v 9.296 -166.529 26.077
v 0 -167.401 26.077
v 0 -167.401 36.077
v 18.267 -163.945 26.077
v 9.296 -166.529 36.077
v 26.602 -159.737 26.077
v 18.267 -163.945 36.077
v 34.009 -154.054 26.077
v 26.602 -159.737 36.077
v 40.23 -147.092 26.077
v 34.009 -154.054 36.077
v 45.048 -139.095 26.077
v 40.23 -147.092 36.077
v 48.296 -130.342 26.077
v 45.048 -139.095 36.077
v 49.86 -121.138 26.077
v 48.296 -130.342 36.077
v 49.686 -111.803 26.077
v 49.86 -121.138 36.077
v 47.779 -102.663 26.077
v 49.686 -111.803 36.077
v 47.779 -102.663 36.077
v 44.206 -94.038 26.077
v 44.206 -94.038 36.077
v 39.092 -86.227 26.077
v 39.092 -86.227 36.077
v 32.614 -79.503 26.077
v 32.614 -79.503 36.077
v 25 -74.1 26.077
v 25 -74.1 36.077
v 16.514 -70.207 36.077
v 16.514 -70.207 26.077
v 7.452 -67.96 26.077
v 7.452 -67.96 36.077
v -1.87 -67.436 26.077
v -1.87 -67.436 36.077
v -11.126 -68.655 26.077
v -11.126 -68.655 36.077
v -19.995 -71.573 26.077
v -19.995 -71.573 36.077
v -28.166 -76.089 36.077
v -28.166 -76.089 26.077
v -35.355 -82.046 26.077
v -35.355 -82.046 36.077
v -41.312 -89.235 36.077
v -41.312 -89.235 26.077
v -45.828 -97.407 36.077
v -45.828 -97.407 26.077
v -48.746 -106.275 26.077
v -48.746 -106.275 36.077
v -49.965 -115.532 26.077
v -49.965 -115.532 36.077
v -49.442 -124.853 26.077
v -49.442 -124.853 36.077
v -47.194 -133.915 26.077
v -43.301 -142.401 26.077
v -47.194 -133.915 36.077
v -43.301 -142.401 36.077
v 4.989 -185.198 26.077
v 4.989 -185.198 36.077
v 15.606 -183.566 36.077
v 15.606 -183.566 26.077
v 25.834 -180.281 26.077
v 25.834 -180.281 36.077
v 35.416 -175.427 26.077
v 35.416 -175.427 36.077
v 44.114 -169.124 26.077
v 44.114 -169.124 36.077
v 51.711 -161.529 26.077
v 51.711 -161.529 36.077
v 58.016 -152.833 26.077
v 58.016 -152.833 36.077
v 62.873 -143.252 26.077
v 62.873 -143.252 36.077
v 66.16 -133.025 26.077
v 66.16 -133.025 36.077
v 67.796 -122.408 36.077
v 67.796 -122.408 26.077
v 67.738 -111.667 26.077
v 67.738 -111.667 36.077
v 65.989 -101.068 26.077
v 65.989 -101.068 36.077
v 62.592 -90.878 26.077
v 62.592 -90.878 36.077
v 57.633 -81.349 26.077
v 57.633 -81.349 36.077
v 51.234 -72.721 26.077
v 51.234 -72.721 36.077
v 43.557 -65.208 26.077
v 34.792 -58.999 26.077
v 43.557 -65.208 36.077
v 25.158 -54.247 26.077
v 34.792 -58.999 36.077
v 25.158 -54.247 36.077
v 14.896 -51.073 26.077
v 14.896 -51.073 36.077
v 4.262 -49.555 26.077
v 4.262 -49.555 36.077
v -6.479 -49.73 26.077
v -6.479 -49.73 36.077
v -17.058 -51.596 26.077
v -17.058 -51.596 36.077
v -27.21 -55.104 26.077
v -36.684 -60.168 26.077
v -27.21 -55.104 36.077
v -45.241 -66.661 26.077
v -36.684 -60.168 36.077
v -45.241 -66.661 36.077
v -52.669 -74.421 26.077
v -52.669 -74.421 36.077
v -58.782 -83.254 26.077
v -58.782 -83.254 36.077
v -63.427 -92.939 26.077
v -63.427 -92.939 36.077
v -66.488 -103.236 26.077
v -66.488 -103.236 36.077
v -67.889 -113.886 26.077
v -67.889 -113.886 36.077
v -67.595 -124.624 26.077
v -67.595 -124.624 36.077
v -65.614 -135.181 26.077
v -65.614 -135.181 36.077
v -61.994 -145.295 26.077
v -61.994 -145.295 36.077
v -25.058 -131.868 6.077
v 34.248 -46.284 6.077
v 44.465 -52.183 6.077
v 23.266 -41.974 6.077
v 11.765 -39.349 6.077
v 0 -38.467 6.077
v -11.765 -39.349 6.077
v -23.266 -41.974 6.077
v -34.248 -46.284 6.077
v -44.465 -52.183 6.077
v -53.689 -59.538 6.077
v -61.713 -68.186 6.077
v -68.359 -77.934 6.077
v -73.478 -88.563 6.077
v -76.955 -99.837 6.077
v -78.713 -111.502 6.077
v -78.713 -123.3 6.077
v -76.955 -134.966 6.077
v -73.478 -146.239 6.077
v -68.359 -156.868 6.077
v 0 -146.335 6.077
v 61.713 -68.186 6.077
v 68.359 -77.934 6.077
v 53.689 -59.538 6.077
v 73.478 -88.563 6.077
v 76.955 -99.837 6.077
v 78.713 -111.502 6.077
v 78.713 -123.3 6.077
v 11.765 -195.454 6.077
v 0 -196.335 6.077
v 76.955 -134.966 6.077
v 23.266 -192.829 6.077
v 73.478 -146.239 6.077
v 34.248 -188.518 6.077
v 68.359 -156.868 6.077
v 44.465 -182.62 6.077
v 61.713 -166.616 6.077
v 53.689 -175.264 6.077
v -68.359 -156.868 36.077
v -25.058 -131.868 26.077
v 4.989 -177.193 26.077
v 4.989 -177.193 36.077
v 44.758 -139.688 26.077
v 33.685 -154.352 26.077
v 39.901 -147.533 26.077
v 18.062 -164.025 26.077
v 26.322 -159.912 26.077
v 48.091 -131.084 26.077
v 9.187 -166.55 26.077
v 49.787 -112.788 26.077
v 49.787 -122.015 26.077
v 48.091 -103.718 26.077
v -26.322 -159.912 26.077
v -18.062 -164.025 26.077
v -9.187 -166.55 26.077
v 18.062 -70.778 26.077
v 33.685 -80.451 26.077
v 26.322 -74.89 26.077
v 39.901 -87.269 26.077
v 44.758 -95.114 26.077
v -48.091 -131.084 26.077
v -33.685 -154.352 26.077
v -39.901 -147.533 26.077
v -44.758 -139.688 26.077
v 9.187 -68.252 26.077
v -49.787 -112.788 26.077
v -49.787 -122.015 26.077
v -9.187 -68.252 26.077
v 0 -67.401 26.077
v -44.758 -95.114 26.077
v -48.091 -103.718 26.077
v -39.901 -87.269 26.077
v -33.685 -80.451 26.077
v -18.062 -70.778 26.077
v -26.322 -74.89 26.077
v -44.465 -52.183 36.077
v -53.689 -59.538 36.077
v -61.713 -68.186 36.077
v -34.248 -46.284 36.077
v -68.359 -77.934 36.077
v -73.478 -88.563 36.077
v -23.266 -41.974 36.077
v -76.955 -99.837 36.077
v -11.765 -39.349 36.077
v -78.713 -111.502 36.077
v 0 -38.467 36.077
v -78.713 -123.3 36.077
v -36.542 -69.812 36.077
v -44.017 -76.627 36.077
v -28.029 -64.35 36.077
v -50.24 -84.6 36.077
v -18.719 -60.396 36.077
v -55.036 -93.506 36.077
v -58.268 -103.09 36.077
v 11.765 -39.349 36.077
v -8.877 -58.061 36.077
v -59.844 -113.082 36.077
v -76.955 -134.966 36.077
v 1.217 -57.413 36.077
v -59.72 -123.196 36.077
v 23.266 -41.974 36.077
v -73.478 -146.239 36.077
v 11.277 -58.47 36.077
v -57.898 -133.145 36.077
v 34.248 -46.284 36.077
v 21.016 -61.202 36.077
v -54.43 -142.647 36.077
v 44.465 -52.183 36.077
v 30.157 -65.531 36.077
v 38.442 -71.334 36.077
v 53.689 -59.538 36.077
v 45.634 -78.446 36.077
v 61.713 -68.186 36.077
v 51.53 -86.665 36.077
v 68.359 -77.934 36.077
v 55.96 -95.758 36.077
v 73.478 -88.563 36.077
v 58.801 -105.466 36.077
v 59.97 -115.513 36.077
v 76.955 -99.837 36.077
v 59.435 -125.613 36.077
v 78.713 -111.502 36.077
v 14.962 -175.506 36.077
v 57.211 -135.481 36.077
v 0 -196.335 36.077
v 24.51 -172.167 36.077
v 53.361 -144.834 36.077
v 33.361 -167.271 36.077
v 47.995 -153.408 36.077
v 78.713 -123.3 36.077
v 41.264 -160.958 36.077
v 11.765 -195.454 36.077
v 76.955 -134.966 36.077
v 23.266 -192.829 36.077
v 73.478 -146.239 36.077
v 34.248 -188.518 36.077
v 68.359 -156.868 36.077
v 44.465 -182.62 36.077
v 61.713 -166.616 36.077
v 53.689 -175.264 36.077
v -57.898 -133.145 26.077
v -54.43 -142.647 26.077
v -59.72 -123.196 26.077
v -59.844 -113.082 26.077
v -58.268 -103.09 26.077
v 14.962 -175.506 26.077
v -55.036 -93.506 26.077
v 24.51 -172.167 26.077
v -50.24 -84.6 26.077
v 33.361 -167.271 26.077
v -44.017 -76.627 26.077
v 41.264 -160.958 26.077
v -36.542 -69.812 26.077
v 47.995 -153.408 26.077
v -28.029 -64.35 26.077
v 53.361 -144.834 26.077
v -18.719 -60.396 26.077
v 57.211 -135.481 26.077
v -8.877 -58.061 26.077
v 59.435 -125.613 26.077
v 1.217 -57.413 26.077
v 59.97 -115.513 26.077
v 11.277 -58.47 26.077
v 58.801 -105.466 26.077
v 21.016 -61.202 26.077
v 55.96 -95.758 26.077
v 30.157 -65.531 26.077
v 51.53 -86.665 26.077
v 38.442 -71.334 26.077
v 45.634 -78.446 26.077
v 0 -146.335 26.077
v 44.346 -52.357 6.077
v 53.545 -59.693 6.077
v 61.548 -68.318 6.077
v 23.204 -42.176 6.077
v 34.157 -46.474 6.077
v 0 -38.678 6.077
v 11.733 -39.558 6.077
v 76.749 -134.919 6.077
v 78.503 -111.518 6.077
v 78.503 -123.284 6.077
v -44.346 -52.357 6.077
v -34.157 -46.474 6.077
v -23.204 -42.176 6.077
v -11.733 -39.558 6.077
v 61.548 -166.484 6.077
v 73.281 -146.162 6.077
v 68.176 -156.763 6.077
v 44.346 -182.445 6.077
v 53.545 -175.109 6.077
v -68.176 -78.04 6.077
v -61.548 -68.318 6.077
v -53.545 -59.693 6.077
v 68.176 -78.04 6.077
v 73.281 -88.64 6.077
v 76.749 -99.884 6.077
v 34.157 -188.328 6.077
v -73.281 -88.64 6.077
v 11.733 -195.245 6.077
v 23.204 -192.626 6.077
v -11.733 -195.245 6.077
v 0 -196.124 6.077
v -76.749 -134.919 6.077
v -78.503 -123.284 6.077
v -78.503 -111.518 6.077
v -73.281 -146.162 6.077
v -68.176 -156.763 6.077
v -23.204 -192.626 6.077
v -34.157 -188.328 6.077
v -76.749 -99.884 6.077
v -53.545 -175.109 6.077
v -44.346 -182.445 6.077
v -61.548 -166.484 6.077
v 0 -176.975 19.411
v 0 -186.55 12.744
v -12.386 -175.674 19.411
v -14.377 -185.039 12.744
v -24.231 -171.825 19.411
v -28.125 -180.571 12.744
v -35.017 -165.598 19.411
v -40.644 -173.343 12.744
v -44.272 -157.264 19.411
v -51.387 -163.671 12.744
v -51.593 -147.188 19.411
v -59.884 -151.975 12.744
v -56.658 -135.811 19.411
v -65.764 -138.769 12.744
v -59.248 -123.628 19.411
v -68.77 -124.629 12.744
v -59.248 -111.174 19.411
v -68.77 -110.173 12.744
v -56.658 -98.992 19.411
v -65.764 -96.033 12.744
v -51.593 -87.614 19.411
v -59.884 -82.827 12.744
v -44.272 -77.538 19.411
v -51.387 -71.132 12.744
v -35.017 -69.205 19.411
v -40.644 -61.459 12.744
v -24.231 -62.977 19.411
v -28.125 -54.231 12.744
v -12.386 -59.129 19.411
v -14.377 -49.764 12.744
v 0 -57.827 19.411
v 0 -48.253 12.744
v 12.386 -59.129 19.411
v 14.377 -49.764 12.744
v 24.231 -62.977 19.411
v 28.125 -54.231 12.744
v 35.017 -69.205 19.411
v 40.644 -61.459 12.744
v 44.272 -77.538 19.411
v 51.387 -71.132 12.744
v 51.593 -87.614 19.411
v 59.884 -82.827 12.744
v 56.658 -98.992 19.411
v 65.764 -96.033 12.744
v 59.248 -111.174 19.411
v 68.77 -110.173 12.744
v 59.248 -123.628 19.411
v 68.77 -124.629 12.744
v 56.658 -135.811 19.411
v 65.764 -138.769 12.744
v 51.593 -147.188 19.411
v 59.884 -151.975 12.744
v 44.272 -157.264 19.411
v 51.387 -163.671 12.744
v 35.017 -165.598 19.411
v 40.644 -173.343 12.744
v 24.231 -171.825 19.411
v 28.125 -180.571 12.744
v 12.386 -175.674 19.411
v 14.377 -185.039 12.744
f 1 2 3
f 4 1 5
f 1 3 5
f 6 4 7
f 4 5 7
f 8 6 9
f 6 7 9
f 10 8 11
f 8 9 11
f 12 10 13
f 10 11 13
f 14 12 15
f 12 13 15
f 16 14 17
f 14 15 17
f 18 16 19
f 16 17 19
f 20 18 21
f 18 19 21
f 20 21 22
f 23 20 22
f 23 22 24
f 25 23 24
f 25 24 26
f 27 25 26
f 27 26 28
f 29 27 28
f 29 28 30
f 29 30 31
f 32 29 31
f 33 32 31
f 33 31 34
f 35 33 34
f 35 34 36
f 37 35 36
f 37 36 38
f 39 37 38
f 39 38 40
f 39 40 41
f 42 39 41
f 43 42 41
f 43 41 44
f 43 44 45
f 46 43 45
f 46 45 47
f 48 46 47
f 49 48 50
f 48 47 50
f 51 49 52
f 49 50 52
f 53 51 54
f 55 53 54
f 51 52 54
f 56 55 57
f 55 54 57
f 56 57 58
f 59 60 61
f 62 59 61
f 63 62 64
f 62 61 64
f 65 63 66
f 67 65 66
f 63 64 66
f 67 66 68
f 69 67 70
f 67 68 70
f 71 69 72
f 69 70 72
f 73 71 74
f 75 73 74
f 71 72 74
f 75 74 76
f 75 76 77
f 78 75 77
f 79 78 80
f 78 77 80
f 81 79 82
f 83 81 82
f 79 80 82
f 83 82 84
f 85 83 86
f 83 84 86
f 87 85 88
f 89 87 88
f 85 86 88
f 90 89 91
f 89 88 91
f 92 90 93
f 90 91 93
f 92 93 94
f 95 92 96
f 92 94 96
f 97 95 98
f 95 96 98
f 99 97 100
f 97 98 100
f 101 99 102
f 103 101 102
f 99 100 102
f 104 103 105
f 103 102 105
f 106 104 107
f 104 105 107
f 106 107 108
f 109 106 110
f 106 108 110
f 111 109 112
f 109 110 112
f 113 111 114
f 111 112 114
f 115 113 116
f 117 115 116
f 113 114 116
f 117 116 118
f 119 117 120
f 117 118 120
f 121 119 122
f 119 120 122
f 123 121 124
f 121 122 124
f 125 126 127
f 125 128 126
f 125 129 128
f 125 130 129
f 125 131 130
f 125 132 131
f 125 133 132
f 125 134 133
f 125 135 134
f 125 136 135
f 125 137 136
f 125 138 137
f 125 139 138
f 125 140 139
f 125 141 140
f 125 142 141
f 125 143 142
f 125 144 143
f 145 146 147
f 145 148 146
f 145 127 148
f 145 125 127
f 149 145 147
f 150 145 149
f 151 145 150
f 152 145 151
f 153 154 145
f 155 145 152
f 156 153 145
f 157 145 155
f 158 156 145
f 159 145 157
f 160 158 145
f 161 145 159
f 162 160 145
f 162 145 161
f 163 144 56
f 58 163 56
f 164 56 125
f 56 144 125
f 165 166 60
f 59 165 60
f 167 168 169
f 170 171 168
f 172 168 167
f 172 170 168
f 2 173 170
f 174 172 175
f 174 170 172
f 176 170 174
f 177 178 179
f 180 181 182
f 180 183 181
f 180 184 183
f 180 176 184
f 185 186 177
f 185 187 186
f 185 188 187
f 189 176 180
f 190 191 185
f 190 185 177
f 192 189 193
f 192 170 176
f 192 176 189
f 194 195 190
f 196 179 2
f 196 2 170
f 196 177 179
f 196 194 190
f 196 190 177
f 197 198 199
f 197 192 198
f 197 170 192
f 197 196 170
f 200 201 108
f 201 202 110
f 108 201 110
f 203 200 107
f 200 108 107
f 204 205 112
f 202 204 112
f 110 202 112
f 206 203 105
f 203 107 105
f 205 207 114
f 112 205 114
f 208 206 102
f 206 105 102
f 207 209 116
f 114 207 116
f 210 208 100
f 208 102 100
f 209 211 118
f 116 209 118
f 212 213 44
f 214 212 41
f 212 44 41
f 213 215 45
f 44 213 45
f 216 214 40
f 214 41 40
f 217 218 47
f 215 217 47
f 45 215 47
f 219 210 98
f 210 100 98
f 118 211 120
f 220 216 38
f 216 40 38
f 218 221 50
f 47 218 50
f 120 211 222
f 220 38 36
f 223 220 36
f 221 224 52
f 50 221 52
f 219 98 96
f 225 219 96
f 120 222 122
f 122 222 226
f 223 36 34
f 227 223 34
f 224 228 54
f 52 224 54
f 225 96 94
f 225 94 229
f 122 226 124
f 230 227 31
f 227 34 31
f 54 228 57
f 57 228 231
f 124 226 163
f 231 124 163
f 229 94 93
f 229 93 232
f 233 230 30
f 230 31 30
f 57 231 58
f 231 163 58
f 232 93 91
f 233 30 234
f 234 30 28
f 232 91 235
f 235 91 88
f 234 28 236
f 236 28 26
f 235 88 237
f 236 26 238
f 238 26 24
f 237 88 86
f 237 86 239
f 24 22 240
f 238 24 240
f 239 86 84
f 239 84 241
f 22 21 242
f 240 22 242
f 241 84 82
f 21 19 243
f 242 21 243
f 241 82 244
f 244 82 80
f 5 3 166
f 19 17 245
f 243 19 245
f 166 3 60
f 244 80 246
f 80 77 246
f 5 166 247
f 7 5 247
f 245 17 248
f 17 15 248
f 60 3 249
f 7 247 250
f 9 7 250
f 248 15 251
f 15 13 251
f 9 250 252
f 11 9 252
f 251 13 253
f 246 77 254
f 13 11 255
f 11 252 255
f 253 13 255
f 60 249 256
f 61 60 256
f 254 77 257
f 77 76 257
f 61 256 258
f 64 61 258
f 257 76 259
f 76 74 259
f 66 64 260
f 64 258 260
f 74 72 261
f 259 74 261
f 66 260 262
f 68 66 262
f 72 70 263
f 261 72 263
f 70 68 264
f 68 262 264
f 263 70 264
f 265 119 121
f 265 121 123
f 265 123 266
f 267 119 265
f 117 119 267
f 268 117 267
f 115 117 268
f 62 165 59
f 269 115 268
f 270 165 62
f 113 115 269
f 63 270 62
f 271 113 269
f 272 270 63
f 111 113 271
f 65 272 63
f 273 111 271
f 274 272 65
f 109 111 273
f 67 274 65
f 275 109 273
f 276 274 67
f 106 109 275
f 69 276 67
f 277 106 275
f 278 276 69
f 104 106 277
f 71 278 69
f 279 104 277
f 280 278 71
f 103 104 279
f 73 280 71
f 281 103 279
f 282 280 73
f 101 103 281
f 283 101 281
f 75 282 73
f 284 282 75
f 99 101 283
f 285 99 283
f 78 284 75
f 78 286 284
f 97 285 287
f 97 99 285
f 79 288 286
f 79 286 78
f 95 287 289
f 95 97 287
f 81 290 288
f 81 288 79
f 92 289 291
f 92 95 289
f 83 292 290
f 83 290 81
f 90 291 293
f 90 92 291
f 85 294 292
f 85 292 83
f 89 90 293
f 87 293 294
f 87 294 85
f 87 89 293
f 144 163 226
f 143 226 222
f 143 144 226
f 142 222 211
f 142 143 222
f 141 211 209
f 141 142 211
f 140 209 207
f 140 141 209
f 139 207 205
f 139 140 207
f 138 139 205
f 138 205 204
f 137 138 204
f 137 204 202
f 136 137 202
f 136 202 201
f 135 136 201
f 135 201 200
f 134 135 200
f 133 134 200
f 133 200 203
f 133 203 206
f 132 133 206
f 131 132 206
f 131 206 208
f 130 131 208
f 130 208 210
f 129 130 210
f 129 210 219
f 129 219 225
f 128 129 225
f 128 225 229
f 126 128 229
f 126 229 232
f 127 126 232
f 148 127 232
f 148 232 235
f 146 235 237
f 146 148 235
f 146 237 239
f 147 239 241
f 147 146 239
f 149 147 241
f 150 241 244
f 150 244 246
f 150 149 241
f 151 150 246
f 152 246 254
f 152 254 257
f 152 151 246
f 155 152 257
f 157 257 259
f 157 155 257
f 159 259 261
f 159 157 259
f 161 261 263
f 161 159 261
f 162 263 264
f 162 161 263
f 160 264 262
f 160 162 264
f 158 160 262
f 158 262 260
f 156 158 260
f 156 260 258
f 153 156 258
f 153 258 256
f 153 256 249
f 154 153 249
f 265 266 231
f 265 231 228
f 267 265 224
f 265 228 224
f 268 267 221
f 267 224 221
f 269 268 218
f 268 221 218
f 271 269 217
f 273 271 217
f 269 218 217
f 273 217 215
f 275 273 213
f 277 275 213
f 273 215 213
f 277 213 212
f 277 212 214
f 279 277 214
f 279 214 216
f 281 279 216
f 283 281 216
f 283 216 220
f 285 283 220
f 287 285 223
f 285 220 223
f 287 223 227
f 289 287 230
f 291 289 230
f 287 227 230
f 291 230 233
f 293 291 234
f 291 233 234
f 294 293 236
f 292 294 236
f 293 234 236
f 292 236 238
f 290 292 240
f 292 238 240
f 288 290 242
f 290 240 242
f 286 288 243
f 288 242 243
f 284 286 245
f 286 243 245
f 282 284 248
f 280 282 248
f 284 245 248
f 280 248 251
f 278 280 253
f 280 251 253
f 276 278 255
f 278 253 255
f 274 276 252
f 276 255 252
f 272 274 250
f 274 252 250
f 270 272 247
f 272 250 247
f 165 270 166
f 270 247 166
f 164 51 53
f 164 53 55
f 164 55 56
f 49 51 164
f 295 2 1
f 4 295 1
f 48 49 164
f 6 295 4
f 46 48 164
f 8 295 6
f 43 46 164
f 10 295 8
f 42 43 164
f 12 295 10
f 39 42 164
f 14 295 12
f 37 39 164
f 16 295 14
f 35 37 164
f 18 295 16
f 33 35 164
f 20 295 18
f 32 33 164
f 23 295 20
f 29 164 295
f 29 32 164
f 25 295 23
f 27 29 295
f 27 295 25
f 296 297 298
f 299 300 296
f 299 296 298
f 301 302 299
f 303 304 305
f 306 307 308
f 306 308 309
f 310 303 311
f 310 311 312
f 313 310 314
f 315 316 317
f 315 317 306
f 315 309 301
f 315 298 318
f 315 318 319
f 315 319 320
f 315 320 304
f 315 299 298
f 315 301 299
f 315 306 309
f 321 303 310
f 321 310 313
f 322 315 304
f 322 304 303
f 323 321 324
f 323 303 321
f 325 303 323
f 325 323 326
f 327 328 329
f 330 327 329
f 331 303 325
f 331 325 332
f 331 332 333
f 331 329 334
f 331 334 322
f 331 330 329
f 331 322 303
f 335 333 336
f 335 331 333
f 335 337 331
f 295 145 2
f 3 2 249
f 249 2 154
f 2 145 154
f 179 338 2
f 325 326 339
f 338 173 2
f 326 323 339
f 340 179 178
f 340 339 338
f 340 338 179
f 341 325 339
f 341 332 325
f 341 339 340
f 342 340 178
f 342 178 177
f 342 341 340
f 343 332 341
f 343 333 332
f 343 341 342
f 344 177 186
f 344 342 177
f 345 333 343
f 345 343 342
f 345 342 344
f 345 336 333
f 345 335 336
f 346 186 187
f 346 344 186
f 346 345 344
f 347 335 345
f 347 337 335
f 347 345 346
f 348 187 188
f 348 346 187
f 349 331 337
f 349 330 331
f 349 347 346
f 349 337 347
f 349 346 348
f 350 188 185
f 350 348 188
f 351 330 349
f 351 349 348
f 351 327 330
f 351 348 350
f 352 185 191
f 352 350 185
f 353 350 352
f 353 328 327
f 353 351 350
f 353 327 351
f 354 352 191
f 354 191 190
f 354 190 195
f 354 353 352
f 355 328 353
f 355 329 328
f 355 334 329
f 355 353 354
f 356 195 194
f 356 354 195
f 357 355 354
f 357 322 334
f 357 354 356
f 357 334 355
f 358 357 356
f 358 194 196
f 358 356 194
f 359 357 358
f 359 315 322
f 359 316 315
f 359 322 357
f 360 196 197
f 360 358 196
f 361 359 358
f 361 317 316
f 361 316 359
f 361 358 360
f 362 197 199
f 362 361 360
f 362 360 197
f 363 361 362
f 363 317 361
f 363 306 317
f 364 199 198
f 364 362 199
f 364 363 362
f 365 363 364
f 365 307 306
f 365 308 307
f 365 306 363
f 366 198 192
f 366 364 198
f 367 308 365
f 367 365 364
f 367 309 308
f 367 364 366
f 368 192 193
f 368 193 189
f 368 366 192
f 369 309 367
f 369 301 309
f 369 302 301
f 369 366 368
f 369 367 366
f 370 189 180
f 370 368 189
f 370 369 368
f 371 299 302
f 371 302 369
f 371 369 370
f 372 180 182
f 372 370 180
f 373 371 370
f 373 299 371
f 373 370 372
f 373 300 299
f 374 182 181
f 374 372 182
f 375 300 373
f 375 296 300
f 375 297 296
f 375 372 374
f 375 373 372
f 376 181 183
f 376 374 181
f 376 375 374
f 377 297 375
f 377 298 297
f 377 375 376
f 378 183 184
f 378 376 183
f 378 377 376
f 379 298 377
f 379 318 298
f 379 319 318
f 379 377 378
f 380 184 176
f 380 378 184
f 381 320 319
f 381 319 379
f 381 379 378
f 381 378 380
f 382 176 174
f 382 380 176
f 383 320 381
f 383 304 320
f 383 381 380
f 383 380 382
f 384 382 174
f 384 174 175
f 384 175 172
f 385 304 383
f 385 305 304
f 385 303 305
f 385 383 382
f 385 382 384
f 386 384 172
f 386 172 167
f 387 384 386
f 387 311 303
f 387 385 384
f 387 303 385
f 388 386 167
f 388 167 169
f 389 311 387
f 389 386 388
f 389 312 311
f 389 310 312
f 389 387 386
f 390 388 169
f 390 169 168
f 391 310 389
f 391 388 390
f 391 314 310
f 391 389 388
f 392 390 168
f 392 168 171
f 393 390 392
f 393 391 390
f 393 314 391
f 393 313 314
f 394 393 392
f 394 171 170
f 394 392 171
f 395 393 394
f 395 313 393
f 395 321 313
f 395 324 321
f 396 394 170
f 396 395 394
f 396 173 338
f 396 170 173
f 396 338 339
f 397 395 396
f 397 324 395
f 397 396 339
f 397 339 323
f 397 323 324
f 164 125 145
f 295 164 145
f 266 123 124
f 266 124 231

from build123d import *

# Parameters (mm, degrees)
F2_R     = 78.9342131776
F3_DEPTH = 30
F5_DEPTH = 30
F7_DEPTH = 10
F8_DEPTH = 10


with BuildPart() as f1:
    # F0 (on Right) → F1 (revolve)
    with BuildSketch(Plane.YZ):
        Polygon((-117.4011141722, 6.0772849967), (-117.4011141722, 26.0772849967), (-167.4011141722, 26.0772849967), (-196.1239274049, 6.0772849967), align=None)
    revolve(axis=Axis((0, -117.4011141722, 16.0772849967), (0, 0, -1)))


with BuildPart() as f3:
    # F2 (on face) → F3 (new body)
    with BuildSketch(Plane(origin=(0, 0, 6.0772849967), x_dir=(1, 0, 0), z_dir=(0, 0, -1))):
        with Locations((0, 117.4011141722)):
            Circle(F2_R)
    extrude(amount=-F3_DEPTH)

    # F4 (on face) → F5 (cut)
    with BuildSketch(Plane(origin=(0, 0, 6.0772849967), x_dir=(1, 0, 0), z_dir=(0, 0, -1))):
        with BuildLine():
            ThreePointArc((0, 196.3353273498), (-39.4671065888, 185.7601480117), (-68.3590338395, 156.868220761))
            Line((-68.3590338395, 156.868220761), (-25.0577636503, 131.868220761))
            Line((-25.0577636503, 131.868220761), (0, 146.3353273498))
            Line((0, 146.3353273498), (0, 196.3353273498))
        make_face()
    extrude(amount=-F5_DEPTH, mode=Mode.SUBTRACT)

    # F6 (on face) → F7 (cut)
    with BuildSketch(Plane.XY.offset(36.0772849967)):
        with BuildLine():
            ThreePointArc((4.9891766792, -185.1979539584), (49.8019499741, -163.6728025756), (67.9801689386, -117.4011141722))
            ThreePointArc((67.9801689386, -117.4011141722), (-14.2643778849, -50.9343488494), (-61.9939385535, -145.2947505711))
            Line((-61.9939385535, -145.2947505711), (-54.4301717399, -142.6470327407))
            ThreePointArc((-54.4301717399, -142.6470327407), (-12.9265172341, -58.8101152714), (60, -117.4011141722))
            ThreePointArc((60, -117.4011141722), (44.1551276793, -158.0253027749), (4.9891766792, -177.1933219928))
            Line((4.9891766792, -177.1933219928), (4.9891766792, -185.1979539584))
        make_face()
    extrude(amount=-F7_DEPTH, mode=Mode.SUBTRACT)

    # F6 (on face) → F8 (cut)
    with BuildSketch(Plane.XY.offset(36.0772849967)):
        with BuildLine():
            Line((-25.0577636503, -131.868220761), (-43.3012701892, -142.4011141722))
            ThreePointArc((-43.3012701892, -142.4011141722), (-25, -160.7023843614), (0, -167.4011141722))
            Line((0, -167.4011141722), (0, -146.3353273498))
            Line((0, -146.3353273498), (-25.0577636503, -131.868220761))
        make_face()
        with BuildLine():
            ThreePointArc((50, -117.4011141722), (-12.9409522551, -69.1048228578), (-43.3012701892, -142.4011141722))
            Line((-43.3012701892, -142.4011141722), (-25.0577636503, -131.868220761))
            Line((-25.0577636503, -131.868220761), (0, -146.3353273498))
            Line((0, -146.3353273498), (0, -167.4011141722))
            ThreePointArc((0, -167.4011141722), (35.3553390593, -152.7564532316), (50, -117.4011141722))
        make_face()
    extrude(amount=-F8_DEPTH, mode=Mode.SUBTRACT)


solid = Compound([f1.part, f3.part])
